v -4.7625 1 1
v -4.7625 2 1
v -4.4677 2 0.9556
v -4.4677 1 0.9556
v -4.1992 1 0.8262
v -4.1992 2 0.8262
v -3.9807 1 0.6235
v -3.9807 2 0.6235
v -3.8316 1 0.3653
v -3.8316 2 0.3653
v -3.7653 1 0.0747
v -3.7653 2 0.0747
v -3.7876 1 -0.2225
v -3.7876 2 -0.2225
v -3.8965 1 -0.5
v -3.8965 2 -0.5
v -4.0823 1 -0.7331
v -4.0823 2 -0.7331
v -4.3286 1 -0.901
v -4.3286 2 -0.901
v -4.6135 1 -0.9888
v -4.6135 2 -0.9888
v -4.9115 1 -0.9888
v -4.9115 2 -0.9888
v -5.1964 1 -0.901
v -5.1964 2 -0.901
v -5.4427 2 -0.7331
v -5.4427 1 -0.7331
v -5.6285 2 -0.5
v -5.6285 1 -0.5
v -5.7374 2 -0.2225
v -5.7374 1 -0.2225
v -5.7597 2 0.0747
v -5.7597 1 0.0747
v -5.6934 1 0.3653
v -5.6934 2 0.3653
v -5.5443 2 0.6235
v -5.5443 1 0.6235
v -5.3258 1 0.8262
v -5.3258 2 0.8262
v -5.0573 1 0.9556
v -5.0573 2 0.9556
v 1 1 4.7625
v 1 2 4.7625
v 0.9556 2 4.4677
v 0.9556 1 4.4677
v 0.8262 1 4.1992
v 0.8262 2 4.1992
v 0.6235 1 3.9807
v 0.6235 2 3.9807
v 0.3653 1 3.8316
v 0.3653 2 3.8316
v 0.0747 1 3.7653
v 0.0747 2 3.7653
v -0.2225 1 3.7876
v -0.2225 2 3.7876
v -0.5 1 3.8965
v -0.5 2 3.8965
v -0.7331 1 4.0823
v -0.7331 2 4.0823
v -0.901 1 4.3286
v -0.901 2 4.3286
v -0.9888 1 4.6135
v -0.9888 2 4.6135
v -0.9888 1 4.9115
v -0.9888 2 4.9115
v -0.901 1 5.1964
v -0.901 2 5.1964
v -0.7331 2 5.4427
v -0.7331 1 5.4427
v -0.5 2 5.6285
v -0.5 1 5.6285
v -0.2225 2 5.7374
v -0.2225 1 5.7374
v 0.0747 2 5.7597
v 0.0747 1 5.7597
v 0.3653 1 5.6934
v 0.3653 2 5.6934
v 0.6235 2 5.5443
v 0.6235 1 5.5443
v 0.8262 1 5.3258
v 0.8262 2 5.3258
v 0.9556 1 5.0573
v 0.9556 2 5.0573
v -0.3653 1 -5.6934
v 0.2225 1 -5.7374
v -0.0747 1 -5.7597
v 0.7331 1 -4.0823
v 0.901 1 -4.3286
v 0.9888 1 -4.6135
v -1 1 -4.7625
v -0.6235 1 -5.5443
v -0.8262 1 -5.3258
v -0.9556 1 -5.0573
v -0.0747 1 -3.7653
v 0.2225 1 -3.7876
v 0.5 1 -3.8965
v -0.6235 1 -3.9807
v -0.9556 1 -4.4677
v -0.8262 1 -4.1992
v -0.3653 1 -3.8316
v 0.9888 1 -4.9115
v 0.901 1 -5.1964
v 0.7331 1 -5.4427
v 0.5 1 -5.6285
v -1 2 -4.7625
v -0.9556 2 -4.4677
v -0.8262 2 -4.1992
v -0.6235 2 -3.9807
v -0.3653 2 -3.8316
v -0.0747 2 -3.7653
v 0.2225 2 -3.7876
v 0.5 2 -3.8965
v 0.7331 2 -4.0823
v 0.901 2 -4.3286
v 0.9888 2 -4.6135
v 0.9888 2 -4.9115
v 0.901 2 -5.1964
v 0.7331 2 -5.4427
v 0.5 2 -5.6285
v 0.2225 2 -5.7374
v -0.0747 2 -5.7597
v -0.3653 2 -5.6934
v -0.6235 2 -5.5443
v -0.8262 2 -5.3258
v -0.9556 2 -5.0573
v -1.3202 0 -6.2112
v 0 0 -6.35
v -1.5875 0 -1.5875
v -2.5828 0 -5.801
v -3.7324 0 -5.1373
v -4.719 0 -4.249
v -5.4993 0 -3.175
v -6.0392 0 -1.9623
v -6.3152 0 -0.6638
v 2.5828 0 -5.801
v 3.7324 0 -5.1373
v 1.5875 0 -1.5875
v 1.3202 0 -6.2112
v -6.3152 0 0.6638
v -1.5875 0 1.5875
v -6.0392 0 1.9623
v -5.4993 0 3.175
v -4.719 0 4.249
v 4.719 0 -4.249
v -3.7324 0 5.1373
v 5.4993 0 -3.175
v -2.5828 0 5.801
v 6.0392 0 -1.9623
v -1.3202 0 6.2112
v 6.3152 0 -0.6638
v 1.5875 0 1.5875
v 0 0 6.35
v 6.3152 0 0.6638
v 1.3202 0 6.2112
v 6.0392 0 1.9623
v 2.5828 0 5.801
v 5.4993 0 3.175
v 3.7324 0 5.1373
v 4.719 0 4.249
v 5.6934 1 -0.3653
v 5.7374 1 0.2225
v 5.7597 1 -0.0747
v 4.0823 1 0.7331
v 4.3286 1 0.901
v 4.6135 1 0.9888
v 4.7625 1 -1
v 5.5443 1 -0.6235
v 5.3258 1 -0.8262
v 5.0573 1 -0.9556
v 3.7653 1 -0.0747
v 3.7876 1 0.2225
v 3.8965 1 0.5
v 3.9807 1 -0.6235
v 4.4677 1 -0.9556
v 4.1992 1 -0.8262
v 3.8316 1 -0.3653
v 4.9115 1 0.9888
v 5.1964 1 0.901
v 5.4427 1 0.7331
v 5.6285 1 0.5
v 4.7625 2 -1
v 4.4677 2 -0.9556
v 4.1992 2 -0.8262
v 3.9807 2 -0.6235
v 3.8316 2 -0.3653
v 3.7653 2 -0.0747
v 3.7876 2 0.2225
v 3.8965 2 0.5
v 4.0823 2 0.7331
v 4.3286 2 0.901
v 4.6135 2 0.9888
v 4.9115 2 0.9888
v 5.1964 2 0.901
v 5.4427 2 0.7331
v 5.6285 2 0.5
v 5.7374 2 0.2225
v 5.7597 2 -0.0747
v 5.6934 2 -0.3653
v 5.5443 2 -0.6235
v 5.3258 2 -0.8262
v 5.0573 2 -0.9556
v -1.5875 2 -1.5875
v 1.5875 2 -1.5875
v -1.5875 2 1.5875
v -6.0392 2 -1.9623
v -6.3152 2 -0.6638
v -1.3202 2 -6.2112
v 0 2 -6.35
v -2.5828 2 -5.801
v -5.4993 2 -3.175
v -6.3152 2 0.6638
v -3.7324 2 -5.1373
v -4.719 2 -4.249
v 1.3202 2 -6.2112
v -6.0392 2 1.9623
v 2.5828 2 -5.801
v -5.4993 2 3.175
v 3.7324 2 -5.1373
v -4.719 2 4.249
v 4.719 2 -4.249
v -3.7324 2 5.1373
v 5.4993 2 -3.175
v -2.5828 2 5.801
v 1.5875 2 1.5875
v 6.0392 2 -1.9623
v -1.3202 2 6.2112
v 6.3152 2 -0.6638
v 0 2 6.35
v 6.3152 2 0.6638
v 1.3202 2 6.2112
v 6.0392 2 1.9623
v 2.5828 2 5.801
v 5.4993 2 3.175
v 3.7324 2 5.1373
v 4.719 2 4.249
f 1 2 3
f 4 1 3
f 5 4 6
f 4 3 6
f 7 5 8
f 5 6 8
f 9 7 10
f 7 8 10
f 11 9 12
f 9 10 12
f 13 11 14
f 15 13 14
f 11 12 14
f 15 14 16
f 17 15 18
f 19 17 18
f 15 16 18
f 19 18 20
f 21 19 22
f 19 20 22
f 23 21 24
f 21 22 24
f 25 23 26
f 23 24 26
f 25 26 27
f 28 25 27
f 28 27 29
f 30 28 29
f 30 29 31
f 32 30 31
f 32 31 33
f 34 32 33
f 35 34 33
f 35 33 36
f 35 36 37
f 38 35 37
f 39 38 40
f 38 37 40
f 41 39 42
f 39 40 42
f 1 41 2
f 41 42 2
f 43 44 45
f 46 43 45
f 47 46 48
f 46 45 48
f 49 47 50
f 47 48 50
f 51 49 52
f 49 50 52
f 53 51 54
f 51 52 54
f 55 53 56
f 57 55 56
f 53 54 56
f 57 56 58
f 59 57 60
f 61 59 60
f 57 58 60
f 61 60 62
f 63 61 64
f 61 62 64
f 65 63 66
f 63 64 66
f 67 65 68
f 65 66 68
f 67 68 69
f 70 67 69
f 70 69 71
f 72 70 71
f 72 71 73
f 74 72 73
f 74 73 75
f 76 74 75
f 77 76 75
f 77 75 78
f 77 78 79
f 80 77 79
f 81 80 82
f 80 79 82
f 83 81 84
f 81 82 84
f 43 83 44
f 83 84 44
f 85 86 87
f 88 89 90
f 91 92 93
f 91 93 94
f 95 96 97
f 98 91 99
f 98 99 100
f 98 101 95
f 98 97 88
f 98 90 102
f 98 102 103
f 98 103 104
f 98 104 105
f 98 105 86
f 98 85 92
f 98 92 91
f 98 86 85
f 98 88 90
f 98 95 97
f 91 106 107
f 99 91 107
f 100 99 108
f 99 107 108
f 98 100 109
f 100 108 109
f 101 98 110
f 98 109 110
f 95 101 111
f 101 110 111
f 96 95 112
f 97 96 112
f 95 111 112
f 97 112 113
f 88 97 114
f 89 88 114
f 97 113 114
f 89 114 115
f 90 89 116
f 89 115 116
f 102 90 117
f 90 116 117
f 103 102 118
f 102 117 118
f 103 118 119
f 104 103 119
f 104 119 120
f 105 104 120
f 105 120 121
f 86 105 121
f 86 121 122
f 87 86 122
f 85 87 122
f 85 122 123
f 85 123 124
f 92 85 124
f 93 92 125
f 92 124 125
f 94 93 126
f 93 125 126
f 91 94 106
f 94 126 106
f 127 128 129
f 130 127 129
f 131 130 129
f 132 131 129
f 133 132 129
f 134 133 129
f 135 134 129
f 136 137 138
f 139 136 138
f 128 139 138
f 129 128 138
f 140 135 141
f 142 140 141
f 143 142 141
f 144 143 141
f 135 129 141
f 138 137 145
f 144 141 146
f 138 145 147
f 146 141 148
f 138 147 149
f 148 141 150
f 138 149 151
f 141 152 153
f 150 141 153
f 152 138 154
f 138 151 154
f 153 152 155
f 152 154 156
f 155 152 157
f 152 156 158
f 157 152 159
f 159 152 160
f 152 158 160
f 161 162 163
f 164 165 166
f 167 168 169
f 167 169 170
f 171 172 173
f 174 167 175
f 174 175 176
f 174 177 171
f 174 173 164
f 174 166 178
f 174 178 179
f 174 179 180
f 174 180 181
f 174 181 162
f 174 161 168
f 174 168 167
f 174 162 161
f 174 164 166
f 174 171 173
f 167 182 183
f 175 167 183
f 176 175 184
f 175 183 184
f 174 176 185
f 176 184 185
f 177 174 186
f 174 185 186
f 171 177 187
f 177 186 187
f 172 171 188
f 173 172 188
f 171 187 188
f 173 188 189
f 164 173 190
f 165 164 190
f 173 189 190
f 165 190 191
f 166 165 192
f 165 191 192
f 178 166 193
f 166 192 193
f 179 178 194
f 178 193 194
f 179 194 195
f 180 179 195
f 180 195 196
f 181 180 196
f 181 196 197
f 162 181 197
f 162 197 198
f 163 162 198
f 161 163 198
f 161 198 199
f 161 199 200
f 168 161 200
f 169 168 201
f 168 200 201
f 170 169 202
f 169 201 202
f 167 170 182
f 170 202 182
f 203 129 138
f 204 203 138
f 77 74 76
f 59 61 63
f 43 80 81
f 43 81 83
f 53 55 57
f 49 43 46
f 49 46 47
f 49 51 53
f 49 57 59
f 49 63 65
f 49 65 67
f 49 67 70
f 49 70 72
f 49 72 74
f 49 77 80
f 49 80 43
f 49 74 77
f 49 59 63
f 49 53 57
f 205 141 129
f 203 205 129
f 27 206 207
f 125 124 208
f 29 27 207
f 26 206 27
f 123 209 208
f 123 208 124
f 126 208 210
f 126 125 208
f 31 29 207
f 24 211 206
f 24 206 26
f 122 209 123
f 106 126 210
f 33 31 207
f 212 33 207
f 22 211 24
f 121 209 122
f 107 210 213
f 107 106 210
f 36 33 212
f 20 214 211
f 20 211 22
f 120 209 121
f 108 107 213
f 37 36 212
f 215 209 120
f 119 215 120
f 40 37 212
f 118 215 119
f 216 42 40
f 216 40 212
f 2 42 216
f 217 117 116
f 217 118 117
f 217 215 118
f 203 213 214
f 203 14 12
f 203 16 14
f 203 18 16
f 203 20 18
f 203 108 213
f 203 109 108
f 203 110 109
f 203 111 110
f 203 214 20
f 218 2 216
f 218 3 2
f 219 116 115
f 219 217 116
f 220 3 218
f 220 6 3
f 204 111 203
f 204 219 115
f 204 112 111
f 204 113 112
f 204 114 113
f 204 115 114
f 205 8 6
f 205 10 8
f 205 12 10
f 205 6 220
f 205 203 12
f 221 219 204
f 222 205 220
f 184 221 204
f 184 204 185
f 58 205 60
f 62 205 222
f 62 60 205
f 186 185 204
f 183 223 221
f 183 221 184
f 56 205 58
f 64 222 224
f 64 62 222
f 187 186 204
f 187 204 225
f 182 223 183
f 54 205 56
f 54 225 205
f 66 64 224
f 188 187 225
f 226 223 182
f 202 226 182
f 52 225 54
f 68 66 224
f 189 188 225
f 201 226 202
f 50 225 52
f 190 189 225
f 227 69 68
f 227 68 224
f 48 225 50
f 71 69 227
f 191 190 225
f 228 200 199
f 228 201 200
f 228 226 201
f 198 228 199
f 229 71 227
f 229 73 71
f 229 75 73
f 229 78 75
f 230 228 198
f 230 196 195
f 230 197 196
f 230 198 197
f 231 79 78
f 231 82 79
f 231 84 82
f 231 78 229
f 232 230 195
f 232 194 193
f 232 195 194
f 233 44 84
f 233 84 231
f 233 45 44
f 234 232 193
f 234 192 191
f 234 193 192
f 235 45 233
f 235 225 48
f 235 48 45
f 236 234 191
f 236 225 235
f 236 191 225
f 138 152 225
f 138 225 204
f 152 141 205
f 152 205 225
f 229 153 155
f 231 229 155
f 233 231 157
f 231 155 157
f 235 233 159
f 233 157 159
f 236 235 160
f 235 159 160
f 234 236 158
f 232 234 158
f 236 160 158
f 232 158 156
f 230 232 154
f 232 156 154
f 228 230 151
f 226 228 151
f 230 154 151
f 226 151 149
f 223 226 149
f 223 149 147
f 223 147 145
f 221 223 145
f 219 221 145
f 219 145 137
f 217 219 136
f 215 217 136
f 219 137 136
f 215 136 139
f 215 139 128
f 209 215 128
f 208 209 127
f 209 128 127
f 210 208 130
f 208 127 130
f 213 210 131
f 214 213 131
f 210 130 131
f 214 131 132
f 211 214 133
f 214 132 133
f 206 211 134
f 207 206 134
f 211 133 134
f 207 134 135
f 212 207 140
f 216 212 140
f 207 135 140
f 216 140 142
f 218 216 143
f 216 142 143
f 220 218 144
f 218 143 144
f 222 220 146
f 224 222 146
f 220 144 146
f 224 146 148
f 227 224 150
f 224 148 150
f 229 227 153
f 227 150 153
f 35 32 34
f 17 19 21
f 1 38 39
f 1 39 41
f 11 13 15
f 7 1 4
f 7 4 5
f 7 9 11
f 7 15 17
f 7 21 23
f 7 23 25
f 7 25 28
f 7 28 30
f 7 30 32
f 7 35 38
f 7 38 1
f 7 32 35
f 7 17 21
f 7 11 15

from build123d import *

# Parameters (mm, degrees)
SKETCH2_R           = 6.35
SKETCH2_W           = 3.175
SKETCH2_H           = 3.175
BOSS_EXTRUDE1_DEPTH = 2
SKETCH3_R           = 1
CUT_EXTRUDE1_DEPTH  = 1
CIRPATTERN1_COUNT   = 4


with BuildPart() as part:
    # Sketch2 → Boss-Extrude1 (new body)
    with BuildSketch(Plane(origin=(0, 0, 0), x_dir=(1, 0, 0), z_dir=(0, 1, 0))):
        with Locations(Location((0, 0, 0), (0, 0, 270))):
            Circle(SKETCH2_R)
        Rectangle(SKETCH2_W, SKETCH2_H, mode=Mode.SUBTRACT)
    extrude(amount=BOSS_EXTRUDE1_DEPTH)

    # Sketch3 → Cut-Extrude1 (cut)
    with BuildSketch(Plane(origin=(0, 2, 0), x_dir=(1, 0, 0), z_dir=(0, 1, 0))):
        with Locations(Location((-4.7625, 0, 0), (0, 0, 270))):
            Circle(SKETCH3_R)
    cut_extrude1 = extrude(amount=-CUT_EXTRUDE1_DEPTH, mode=Mode.SUBTRACT)

    # CirPattern1: Cut-Extrude1 ×4 about axis
    cirpattern1_axis = Axis((0, 0, 0), (0, 1, 0))
    for i in range(1, CIRPATTERN1_COUNT):
        add(cut_extrude1.rotate(cirpattern1_axis, i * 360 / CIRPATTERN1_COUNT), mode=Mode.SUBTRACT)


solid = part.part
